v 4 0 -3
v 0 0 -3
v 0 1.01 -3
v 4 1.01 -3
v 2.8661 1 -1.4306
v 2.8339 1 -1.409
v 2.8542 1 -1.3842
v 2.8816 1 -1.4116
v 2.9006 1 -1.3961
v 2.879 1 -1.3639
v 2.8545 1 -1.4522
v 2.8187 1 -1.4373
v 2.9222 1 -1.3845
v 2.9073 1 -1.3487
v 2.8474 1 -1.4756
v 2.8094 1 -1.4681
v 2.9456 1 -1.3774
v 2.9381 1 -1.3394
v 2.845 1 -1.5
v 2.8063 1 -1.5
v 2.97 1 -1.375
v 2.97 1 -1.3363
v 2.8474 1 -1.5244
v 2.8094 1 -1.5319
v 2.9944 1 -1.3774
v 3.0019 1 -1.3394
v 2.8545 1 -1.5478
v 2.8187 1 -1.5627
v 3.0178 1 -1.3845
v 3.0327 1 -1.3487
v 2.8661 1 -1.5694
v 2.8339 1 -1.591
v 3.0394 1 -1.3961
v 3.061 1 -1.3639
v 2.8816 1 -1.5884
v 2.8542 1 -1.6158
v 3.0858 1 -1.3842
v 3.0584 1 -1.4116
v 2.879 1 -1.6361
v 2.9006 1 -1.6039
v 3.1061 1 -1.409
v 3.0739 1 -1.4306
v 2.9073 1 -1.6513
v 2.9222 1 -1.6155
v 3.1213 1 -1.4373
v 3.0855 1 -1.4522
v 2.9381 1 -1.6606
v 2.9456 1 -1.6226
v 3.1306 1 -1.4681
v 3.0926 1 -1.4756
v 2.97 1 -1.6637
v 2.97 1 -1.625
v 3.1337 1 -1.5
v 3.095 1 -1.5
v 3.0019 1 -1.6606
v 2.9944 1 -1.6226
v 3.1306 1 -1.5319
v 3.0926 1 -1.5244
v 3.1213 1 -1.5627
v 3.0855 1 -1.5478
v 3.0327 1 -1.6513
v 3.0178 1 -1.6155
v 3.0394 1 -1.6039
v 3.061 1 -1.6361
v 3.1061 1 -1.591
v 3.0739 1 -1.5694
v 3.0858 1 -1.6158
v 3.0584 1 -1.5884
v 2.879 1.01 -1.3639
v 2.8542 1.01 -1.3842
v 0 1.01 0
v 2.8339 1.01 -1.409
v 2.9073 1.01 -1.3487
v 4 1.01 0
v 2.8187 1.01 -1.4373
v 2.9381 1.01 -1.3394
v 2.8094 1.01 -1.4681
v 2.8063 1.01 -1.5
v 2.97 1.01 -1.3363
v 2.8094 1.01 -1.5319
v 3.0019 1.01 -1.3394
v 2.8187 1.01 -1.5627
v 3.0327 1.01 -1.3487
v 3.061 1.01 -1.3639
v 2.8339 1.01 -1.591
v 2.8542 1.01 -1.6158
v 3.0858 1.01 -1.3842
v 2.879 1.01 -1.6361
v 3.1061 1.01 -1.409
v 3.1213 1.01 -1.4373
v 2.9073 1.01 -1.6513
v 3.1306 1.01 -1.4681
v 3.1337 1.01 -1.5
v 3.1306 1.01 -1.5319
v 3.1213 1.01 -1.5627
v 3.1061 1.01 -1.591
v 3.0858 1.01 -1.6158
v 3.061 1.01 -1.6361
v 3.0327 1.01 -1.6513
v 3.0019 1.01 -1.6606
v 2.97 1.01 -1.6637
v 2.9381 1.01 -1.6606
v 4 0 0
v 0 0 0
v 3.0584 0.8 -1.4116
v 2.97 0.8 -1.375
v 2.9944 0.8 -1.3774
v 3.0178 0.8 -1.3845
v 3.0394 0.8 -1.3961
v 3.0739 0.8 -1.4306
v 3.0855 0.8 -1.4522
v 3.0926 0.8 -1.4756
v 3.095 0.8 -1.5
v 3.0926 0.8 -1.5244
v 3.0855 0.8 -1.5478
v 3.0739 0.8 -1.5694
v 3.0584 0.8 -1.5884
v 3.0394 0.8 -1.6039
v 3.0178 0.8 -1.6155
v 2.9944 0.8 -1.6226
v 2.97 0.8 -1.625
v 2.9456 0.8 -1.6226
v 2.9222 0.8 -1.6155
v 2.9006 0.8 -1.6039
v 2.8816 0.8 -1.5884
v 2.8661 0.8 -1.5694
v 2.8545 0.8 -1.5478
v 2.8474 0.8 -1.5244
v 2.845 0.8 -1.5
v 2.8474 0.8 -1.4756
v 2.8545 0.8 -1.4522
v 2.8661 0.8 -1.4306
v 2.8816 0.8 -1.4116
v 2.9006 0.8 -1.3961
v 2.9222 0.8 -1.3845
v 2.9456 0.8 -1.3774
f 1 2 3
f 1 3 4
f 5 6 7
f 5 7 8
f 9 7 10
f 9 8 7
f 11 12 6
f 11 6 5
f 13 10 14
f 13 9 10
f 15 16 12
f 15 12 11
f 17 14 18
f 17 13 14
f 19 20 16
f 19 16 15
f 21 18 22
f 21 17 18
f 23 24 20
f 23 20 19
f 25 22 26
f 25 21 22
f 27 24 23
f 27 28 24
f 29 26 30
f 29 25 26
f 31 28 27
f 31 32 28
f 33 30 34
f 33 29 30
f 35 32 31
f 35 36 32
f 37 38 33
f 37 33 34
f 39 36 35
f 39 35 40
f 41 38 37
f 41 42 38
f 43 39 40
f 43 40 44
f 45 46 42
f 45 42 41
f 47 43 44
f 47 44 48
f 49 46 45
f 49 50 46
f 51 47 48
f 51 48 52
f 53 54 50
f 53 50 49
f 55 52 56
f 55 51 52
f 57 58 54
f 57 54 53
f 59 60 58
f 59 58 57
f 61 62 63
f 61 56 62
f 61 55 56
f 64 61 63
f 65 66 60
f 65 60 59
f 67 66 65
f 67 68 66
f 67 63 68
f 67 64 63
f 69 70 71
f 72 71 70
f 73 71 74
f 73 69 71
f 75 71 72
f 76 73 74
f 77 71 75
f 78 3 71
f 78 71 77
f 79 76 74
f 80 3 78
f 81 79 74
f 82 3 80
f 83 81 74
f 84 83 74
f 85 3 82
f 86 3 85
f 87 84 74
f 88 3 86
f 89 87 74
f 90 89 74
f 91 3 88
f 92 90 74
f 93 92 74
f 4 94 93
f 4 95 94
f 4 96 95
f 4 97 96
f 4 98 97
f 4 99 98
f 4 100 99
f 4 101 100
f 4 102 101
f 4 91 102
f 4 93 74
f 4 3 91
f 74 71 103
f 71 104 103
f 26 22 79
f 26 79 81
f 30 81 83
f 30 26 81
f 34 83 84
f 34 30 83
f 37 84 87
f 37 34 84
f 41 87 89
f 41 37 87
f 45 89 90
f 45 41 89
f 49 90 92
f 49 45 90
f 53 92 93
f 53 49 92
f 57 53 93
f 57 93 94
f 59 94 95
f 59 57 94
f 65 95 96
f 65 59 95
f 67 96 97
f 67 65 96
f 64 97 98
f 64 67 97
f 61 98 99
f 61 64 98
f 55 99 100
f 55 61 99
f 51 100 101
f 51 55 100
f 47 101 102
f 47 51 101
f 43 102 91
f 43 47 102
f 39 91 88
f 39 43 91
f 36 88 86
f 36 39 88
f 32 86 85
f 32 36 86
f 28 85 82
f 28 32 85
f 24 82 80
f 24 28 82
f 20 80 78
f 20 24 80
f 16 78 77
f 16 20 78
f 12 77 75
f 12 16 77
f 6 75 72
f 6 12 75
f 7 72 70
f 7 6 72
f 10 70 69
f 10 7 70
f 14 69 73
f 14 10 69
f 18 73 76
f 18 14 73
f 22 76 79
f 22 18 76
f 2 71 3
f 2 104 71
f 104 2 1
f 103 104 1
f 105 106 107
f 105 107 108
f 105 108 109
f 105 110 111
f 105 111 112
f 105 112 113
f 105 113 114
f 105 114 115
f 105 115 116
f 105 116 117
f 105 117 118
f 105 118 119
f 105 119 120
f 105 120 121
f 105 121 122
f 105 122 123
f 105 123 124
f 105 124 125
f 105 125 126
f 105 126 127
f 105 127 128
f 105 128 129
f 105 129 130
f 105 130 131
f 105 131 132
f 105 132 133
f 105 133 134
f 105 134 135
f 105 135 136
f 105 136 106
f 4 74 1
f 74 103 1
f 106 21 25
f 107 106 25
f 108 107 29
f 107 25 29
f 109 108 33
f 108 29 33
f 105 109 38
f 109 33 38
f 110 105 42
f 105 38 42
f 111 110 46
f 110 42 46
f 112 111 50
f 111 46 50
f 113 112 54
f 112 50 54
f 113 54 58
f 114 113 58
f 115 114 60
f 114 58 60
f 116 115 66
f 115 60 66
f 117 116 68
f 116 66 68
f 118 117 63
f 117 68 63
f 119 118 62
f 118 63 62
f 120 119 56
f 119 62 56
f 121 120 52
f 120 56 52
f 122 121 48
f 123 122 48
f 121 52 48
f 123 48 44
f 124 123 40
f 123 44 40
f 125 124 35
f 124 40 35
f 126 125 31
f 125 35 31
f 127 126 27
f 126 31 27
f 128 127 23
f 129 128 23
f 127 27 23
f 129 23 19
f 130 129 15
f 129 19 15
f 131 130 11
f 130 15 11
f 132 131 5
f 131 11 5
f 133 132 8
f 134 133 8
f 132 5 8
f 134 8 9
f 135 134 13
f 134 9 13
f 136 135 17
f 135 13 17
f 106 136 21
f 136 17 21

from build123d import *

# Parameters (mm, degrees)
SKETCH1_W           = 4
SKETCH1_H           = 3
BOSS_EXTRUDE1_DEPTH = 1
SKETCH2_R           = 0.125
CUT_EXTRUDE1_DEPTH  = 0.2
SKETCH3_W           = 4
SKETCH3_H           = 3
SKETCH3_R           = 0.163722277
BOSS_EXTRUDE2_DEPTH = 0.01


with BuildPart() as part:
    # Sketch1 → Boss-Extrude1 (new body)
    with BuildSketch(Plane(origin=(0, 0, 0), x_dir=(1, 0, 0), z_dir=(0, 1, 0))):
        with Locations((2, 1.5)):
            Rectangle(SKETCH1_W, SKETCH1_H)
    extrude(amount=BOSS_EXTRUDE1_DEPTH)

    # Sketch2 → Cut-Extrude1 (cut)
    with BuildSketch(Plane(origin=(0, 1, 0), x_dir=(1, 0, 0), z_dir=(0, 1, 0))):
        with Locations(Location((2.97, 1.5, 0), (0, 0, 270))):
            Circle(SKETCH2_R)
    extrude(amount=-CUT_EXTRUDE1_DEPTH, mode=Mode.SUBTRACT)

    # Sketch3 → Boss-Extrude2 (add)
    with BuildSketch(Plane(origin=(0, 1, 0), x_dir=(1, 0, 0), z_dir=(0, 1, 0))):
        with Locations((2, 1.5)):
            Rectangle(SKETCH3_W, SKETCH3_H)
        with Locations(Location((2.97, 1.5, 0), (0, 0, 270))):
            Circle(SKETCH3_R, mode=Mode.SUBTRACT)
    extrude(amount=BOSS_EXTRUDE2_DEPTH)


solid = part.part
